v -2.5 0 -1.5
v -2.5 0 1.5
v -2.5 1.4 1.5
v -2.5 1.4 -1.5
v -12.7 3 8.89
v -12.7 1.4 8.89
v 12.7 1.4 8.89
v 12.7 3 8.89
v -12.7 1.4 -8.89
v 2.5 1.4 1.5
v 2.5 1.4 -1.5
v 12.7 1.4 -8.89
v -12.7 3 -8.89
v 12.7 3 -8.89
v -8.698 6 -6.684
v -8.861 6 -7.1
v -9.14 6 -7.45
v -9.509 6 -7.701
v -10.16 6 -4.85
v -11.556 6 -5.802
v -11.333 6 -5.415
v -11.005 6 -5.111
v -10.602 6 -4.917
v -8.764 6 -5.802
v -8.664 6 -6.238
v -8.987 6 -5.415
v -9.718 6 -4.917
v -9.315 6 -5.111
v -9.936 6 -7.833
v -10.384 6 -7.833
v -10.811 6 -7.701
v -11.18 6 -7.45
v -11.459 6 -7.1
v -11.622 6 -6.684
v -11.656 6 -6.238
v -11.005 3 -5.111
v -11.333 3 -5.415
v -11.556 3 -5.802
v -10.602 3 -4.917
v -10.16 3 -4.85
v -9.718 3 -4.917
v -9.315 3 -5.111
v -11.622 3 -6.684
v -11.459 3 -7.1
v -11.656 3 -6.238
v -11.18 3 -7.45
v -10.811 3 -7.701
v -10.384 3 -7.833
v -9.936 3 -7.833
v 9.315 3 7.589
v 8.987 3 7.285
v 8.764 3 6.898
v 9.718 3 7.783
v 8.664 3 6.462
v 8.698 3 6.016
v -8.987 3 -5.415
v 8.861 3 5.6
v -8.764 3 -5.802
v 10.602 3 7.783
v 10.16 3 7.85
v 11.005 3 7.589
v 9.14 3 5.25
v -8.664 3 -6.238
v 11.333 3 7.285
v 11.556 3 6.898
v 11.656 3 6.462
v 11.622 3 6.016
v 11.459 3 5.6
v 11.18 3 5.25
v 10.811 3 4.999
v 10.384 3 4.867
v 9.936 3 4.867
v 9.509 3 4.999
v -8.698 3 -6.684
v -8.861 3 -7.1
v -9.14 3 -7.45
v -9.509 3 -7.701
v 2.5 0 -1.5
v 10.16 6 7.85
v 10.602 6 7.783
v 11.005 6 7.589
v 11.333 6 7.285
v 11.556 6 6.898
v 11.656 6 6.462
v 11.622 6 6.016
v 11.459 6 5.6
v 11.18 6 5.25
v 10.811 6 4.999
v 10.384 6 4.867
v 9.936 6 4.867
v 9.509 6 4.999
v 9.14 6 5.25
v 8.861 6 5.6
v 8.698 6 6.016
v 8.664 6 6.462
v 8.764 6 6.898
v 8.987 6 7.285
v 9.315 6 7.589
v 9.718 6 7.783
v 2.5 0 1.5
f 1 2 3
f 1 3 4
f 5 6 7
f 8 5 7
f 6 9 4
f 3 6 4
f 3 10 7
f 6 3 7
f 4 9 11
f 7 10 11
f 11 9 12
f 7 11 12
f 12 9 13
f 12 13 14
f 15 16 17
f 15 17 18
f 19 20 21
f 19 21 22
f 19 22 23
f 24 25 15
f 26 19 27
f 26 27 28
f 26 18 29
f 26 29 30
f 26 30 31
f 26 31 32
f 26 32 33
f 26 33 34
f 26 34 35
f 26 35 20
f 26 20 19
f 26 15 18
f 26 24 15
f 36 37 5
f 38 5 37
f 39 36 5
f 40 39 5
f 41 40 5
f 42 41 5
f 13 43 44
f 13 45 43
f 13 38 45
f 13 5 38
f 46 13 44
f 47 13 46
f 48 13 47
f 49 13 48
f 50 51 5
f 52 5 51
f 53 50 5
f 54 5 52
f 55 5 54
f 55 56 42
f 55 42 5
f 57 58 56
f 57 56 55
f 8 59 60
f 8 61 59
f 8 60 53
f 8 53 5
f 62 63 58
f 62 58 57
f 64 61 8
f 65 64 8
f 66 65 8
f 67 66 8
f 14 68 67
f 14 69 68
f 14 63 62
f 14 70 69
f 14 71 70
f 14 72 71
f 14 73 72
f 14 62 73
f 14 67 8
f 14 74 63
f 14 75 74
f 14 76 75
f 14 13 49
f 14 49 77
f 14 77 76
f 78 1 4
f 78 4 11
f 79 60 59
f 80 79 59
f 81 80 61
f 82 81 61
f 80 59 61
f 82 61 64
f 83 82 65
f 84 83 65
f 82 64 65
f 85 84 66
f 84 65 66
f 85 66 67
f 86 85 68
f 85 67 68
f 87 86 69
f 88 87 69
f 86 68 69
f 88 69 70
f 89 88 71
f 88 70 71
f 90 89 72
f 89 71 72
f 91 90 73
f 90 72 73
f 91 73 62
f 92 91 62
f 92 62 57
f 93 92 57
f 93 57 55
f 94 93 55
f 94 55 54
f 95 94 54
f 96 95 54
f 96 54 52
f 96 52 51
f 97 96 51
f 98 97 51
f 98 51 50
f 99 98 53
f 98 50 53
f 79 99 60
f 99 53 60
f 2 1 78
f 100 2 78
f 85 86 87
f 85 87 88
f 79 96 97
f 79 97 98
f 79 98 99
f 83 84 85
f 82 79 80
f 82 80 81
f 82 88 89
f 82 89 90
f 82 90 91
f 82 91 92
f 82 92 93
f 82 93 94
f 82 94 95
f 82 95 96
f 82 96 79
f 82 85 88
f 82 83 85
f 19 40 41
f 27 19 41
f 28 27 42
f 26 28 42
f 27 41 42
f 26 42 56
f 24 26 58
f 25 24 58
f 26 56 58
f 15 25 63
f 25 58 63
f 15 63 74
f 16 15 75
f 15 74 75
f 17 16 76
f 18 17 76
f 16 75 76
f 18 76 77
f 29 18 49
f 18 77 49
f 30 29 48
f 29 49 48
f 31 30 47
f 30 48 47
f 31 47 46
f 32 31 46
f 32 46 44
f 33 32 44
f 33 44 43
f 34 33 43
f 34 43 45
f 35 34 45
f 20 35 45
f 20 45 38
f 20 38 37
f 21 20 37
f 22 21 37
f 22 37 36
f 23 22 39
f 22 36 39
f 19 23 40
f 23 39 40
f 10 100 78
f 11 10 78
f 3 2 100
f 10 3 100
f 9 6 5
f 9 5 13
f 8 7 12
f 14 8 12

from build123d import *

# Parameters (mm, degrees)
P01_STANDOFF_START      = 3
SK_P01_STANDOFF_R       = 1.5
P01_STANDOFF_DEPTH      = 3
P02_STANDOFF_START      = 3
SK_P02_STANDOFF_R       = 1.5
P02_STANDOFF_DEPTH      = 3
P03_VL53L4CDBOARD_START = 1.4
SK_P03_VL53L4CDBOARD_W  = 25.4
SK_P03_VL53L4CDBOARD_H  = 17.78
P03_VL53L4CDBOARD_DEPTH = 1.6
SK_P04_TOFSENSOR_W      = 5
SK_P04_TOFSENSOR_H      = 3
P04_TOFSENSOR_DEPTH     = 1.4


with BuildPart() as part:
    # SK_P01_Standoff → P01_Standoff (new body)
    with BuildSketch(Plane(origin=(0, 0, 0), x_dir=(1, 0, 0), z_dir=(0, 1, 0)).offset(P01_STANDOFF_START)):
        with Locations(Location((-10.16, 6.35, 0), (0, 0, 270))):
            Circle(SK_P01_STANDOFF_R)
    extrude(amount=P01_STANDOFF_DEPTH)



with BuildPart() as body_2:
    # SK_P02_Standoff → P02_Standoff (new body)
    with BuildSketch(Plane(origin=(0, 0, 0), x_dir=(1, 0, 0), z_dir=(0, 1, 0)).offset(P02_STANDOFF_START)):
        with Locations(Location((10.16, -6.35, 0), (0, 0, 270))):
            Circle(SK_P02_STANDOFF_R)
    extrude(amount=P02_STANDOFF_DEPTH)


with BuildPart() as part_1:
    add(part.part)

    add(body_2.part)  # P03_VL53L4CDboard merges body 2
    # SK_P03_VL53L4CDboard → P03_VL53L4CDboard (add)
    with BuildSketch(Plane(origin=(0, 0, 0), x_dir=(1, 0, 0), z_dir=(0, 1, 0)).offset(P03_VL53L4CDBOARD_START)):
        Rectangle(SK_P03_VL53L4CDBOARD_W, SK_P03_VL53L4CDBOARD_H)
    extrude(amount=P03_VL53L4CDBOARD_DEPTH)

    # SK_P04_ToFsensor → P04_ToFsensor (add)
    with BuildSketch(Plane(origin=(0, 0, 0), x_dir=(1, 0, 0), z_dir=(0, 1, 0))):
        Rectangle(SK_P04_TOFSENSOR_W, SK_P04_TOFSENSOR_H)
    extrude(amount=P04_TOFSENSOR_DEPTH)


solid = part_1.part
